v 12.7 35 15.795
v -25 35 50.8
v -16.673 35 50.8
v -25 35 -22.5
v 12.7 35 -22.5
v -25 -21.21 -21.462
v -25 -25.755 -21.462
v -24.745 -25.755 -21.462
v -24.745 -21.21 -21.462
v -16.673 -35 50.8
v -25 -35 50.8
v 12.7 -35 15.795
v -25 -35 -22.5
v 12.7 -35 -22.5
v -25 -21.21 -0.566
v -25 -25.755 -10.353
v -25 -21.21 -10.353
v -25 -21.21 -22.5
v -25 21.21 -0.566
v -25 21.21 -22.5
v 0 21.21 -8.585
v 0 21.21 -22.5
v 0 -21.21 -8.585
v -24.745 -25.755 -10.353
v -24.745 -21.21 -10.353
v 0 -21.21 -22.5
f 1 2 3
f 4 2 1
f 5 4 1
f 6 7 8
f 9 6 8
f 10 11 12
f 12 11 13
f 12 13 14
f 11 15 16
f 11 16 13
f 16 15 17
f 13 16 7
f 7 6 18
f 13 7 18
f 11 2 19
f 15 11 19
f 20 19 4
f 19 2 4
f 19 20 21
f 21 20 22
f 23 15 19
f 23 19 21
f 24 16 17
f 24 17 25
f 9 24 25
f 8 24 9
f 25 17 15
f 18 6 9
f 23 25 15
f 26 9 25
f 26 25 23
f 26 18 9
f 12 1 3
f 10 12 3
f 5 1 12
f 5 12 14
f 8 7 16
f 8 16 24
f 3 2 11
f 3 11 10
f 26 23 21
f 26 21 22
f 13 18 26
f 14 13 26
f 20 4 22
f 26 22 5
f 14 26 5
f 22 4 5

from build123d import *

# Parameters (mm, degrees)
SKETCH1_W           = 37.7
SKETCH1_H           = 80.8
BOSS_EXTRUDE1_DEPTH = 35
CAVITY1_START       = -21.21
CAVITY1_DEPTH       = 42.42
CAVITY1_START_2     = -25.755
CAVITY1_2_OUTLINE_W = 0.255
CAVITY1_2_OUTLINE_H = 11.11
CAVITY1_2_DEPTH     = 4.545
CUT_EXTRUDE1_DEPTH  = 91.031327881
CUT_EXTRUDE2_DEPTH  = 7.5


# Read off the part's stored shape, not the designer's step: Cavity1
with BuildPart() as part:
    # Sketch1 → Boss-Extrude1 (new, symmetric)
    with BuildSketch(Plane(origin=(0, 0, 0), x_dir=(1, 0, 0), z_dir=(0, 1, 0))):
        with Locations((-6.15, -10.4)):
            Rectangle(SKETCH1_W, SKETCH1_H)
    extrude(amount=BOSS_EXTRUDE1_DEPTH, both=True)

    # Cavity1 outline → Cavity1 (cut)
    with BuildSketch(Plane(origin=(0, 0, 0), x_dir=(1, 0, 0), z_dir=(0, 1, 0)).offset(CAVITY1_START)):
        Polygon((0, 8.585), (0, 30), (-25, 30), (-25, 0.566132075), align=None)
    extrude(amount=CAVITY1_DEPTH, mode=Mode.SUBTRACT)

    # Cavity1 2 outline → Cavity1 2 (cut)
    with BuildSketch(Plane(origin=(0, 0, 0), x_dir=(1, 0, 0), z_dir=(0, 1, 0)).offset(CAVITY1_START_2)):
        with Locations((-24.8725, 15.9075)):
            Rectangle(CAVITY1_2_OUTLINE_W, CAVITY1_2_OUTLINE_H)
    extrude(amount=CAVITY1_2_DEPTH, mode=Mode.SUBTRACT)

    # Sketch2 → Cut-Extrude1 (cut, through all)
    with BuildSketch(Plane(origin=(0, 35, 0), x_dir=(1, 0, 0), z_dir=(0, 1, 0))):
        Polygon((12.7, -15.795114576), (-16.672586448, -50.8), (12.7, -50.8), align=None)
    extrude(amount=-CUT_EXTRUDE1_DEPTH, mode=Mode.SUBTRACT)

    # Sketch3 → Cut-Extrude2 (cut)
    with BuildSketch(Plane(origin=(0, 0, -30), x_dir=(-1, 0, 0), z_dir=(0, 0, -1))):
        Polygon((-12.7, 35), (25, 35), (25, 21.21), (0, 21.21), (0, -21.21), (25, -21.21), (25, -35), (-12.7, -35), align=None)
    extrude(amount=-CUT_EXTRUDE2_DEPTH, mode=Mode.SUBTRACT)


solid = part.part
